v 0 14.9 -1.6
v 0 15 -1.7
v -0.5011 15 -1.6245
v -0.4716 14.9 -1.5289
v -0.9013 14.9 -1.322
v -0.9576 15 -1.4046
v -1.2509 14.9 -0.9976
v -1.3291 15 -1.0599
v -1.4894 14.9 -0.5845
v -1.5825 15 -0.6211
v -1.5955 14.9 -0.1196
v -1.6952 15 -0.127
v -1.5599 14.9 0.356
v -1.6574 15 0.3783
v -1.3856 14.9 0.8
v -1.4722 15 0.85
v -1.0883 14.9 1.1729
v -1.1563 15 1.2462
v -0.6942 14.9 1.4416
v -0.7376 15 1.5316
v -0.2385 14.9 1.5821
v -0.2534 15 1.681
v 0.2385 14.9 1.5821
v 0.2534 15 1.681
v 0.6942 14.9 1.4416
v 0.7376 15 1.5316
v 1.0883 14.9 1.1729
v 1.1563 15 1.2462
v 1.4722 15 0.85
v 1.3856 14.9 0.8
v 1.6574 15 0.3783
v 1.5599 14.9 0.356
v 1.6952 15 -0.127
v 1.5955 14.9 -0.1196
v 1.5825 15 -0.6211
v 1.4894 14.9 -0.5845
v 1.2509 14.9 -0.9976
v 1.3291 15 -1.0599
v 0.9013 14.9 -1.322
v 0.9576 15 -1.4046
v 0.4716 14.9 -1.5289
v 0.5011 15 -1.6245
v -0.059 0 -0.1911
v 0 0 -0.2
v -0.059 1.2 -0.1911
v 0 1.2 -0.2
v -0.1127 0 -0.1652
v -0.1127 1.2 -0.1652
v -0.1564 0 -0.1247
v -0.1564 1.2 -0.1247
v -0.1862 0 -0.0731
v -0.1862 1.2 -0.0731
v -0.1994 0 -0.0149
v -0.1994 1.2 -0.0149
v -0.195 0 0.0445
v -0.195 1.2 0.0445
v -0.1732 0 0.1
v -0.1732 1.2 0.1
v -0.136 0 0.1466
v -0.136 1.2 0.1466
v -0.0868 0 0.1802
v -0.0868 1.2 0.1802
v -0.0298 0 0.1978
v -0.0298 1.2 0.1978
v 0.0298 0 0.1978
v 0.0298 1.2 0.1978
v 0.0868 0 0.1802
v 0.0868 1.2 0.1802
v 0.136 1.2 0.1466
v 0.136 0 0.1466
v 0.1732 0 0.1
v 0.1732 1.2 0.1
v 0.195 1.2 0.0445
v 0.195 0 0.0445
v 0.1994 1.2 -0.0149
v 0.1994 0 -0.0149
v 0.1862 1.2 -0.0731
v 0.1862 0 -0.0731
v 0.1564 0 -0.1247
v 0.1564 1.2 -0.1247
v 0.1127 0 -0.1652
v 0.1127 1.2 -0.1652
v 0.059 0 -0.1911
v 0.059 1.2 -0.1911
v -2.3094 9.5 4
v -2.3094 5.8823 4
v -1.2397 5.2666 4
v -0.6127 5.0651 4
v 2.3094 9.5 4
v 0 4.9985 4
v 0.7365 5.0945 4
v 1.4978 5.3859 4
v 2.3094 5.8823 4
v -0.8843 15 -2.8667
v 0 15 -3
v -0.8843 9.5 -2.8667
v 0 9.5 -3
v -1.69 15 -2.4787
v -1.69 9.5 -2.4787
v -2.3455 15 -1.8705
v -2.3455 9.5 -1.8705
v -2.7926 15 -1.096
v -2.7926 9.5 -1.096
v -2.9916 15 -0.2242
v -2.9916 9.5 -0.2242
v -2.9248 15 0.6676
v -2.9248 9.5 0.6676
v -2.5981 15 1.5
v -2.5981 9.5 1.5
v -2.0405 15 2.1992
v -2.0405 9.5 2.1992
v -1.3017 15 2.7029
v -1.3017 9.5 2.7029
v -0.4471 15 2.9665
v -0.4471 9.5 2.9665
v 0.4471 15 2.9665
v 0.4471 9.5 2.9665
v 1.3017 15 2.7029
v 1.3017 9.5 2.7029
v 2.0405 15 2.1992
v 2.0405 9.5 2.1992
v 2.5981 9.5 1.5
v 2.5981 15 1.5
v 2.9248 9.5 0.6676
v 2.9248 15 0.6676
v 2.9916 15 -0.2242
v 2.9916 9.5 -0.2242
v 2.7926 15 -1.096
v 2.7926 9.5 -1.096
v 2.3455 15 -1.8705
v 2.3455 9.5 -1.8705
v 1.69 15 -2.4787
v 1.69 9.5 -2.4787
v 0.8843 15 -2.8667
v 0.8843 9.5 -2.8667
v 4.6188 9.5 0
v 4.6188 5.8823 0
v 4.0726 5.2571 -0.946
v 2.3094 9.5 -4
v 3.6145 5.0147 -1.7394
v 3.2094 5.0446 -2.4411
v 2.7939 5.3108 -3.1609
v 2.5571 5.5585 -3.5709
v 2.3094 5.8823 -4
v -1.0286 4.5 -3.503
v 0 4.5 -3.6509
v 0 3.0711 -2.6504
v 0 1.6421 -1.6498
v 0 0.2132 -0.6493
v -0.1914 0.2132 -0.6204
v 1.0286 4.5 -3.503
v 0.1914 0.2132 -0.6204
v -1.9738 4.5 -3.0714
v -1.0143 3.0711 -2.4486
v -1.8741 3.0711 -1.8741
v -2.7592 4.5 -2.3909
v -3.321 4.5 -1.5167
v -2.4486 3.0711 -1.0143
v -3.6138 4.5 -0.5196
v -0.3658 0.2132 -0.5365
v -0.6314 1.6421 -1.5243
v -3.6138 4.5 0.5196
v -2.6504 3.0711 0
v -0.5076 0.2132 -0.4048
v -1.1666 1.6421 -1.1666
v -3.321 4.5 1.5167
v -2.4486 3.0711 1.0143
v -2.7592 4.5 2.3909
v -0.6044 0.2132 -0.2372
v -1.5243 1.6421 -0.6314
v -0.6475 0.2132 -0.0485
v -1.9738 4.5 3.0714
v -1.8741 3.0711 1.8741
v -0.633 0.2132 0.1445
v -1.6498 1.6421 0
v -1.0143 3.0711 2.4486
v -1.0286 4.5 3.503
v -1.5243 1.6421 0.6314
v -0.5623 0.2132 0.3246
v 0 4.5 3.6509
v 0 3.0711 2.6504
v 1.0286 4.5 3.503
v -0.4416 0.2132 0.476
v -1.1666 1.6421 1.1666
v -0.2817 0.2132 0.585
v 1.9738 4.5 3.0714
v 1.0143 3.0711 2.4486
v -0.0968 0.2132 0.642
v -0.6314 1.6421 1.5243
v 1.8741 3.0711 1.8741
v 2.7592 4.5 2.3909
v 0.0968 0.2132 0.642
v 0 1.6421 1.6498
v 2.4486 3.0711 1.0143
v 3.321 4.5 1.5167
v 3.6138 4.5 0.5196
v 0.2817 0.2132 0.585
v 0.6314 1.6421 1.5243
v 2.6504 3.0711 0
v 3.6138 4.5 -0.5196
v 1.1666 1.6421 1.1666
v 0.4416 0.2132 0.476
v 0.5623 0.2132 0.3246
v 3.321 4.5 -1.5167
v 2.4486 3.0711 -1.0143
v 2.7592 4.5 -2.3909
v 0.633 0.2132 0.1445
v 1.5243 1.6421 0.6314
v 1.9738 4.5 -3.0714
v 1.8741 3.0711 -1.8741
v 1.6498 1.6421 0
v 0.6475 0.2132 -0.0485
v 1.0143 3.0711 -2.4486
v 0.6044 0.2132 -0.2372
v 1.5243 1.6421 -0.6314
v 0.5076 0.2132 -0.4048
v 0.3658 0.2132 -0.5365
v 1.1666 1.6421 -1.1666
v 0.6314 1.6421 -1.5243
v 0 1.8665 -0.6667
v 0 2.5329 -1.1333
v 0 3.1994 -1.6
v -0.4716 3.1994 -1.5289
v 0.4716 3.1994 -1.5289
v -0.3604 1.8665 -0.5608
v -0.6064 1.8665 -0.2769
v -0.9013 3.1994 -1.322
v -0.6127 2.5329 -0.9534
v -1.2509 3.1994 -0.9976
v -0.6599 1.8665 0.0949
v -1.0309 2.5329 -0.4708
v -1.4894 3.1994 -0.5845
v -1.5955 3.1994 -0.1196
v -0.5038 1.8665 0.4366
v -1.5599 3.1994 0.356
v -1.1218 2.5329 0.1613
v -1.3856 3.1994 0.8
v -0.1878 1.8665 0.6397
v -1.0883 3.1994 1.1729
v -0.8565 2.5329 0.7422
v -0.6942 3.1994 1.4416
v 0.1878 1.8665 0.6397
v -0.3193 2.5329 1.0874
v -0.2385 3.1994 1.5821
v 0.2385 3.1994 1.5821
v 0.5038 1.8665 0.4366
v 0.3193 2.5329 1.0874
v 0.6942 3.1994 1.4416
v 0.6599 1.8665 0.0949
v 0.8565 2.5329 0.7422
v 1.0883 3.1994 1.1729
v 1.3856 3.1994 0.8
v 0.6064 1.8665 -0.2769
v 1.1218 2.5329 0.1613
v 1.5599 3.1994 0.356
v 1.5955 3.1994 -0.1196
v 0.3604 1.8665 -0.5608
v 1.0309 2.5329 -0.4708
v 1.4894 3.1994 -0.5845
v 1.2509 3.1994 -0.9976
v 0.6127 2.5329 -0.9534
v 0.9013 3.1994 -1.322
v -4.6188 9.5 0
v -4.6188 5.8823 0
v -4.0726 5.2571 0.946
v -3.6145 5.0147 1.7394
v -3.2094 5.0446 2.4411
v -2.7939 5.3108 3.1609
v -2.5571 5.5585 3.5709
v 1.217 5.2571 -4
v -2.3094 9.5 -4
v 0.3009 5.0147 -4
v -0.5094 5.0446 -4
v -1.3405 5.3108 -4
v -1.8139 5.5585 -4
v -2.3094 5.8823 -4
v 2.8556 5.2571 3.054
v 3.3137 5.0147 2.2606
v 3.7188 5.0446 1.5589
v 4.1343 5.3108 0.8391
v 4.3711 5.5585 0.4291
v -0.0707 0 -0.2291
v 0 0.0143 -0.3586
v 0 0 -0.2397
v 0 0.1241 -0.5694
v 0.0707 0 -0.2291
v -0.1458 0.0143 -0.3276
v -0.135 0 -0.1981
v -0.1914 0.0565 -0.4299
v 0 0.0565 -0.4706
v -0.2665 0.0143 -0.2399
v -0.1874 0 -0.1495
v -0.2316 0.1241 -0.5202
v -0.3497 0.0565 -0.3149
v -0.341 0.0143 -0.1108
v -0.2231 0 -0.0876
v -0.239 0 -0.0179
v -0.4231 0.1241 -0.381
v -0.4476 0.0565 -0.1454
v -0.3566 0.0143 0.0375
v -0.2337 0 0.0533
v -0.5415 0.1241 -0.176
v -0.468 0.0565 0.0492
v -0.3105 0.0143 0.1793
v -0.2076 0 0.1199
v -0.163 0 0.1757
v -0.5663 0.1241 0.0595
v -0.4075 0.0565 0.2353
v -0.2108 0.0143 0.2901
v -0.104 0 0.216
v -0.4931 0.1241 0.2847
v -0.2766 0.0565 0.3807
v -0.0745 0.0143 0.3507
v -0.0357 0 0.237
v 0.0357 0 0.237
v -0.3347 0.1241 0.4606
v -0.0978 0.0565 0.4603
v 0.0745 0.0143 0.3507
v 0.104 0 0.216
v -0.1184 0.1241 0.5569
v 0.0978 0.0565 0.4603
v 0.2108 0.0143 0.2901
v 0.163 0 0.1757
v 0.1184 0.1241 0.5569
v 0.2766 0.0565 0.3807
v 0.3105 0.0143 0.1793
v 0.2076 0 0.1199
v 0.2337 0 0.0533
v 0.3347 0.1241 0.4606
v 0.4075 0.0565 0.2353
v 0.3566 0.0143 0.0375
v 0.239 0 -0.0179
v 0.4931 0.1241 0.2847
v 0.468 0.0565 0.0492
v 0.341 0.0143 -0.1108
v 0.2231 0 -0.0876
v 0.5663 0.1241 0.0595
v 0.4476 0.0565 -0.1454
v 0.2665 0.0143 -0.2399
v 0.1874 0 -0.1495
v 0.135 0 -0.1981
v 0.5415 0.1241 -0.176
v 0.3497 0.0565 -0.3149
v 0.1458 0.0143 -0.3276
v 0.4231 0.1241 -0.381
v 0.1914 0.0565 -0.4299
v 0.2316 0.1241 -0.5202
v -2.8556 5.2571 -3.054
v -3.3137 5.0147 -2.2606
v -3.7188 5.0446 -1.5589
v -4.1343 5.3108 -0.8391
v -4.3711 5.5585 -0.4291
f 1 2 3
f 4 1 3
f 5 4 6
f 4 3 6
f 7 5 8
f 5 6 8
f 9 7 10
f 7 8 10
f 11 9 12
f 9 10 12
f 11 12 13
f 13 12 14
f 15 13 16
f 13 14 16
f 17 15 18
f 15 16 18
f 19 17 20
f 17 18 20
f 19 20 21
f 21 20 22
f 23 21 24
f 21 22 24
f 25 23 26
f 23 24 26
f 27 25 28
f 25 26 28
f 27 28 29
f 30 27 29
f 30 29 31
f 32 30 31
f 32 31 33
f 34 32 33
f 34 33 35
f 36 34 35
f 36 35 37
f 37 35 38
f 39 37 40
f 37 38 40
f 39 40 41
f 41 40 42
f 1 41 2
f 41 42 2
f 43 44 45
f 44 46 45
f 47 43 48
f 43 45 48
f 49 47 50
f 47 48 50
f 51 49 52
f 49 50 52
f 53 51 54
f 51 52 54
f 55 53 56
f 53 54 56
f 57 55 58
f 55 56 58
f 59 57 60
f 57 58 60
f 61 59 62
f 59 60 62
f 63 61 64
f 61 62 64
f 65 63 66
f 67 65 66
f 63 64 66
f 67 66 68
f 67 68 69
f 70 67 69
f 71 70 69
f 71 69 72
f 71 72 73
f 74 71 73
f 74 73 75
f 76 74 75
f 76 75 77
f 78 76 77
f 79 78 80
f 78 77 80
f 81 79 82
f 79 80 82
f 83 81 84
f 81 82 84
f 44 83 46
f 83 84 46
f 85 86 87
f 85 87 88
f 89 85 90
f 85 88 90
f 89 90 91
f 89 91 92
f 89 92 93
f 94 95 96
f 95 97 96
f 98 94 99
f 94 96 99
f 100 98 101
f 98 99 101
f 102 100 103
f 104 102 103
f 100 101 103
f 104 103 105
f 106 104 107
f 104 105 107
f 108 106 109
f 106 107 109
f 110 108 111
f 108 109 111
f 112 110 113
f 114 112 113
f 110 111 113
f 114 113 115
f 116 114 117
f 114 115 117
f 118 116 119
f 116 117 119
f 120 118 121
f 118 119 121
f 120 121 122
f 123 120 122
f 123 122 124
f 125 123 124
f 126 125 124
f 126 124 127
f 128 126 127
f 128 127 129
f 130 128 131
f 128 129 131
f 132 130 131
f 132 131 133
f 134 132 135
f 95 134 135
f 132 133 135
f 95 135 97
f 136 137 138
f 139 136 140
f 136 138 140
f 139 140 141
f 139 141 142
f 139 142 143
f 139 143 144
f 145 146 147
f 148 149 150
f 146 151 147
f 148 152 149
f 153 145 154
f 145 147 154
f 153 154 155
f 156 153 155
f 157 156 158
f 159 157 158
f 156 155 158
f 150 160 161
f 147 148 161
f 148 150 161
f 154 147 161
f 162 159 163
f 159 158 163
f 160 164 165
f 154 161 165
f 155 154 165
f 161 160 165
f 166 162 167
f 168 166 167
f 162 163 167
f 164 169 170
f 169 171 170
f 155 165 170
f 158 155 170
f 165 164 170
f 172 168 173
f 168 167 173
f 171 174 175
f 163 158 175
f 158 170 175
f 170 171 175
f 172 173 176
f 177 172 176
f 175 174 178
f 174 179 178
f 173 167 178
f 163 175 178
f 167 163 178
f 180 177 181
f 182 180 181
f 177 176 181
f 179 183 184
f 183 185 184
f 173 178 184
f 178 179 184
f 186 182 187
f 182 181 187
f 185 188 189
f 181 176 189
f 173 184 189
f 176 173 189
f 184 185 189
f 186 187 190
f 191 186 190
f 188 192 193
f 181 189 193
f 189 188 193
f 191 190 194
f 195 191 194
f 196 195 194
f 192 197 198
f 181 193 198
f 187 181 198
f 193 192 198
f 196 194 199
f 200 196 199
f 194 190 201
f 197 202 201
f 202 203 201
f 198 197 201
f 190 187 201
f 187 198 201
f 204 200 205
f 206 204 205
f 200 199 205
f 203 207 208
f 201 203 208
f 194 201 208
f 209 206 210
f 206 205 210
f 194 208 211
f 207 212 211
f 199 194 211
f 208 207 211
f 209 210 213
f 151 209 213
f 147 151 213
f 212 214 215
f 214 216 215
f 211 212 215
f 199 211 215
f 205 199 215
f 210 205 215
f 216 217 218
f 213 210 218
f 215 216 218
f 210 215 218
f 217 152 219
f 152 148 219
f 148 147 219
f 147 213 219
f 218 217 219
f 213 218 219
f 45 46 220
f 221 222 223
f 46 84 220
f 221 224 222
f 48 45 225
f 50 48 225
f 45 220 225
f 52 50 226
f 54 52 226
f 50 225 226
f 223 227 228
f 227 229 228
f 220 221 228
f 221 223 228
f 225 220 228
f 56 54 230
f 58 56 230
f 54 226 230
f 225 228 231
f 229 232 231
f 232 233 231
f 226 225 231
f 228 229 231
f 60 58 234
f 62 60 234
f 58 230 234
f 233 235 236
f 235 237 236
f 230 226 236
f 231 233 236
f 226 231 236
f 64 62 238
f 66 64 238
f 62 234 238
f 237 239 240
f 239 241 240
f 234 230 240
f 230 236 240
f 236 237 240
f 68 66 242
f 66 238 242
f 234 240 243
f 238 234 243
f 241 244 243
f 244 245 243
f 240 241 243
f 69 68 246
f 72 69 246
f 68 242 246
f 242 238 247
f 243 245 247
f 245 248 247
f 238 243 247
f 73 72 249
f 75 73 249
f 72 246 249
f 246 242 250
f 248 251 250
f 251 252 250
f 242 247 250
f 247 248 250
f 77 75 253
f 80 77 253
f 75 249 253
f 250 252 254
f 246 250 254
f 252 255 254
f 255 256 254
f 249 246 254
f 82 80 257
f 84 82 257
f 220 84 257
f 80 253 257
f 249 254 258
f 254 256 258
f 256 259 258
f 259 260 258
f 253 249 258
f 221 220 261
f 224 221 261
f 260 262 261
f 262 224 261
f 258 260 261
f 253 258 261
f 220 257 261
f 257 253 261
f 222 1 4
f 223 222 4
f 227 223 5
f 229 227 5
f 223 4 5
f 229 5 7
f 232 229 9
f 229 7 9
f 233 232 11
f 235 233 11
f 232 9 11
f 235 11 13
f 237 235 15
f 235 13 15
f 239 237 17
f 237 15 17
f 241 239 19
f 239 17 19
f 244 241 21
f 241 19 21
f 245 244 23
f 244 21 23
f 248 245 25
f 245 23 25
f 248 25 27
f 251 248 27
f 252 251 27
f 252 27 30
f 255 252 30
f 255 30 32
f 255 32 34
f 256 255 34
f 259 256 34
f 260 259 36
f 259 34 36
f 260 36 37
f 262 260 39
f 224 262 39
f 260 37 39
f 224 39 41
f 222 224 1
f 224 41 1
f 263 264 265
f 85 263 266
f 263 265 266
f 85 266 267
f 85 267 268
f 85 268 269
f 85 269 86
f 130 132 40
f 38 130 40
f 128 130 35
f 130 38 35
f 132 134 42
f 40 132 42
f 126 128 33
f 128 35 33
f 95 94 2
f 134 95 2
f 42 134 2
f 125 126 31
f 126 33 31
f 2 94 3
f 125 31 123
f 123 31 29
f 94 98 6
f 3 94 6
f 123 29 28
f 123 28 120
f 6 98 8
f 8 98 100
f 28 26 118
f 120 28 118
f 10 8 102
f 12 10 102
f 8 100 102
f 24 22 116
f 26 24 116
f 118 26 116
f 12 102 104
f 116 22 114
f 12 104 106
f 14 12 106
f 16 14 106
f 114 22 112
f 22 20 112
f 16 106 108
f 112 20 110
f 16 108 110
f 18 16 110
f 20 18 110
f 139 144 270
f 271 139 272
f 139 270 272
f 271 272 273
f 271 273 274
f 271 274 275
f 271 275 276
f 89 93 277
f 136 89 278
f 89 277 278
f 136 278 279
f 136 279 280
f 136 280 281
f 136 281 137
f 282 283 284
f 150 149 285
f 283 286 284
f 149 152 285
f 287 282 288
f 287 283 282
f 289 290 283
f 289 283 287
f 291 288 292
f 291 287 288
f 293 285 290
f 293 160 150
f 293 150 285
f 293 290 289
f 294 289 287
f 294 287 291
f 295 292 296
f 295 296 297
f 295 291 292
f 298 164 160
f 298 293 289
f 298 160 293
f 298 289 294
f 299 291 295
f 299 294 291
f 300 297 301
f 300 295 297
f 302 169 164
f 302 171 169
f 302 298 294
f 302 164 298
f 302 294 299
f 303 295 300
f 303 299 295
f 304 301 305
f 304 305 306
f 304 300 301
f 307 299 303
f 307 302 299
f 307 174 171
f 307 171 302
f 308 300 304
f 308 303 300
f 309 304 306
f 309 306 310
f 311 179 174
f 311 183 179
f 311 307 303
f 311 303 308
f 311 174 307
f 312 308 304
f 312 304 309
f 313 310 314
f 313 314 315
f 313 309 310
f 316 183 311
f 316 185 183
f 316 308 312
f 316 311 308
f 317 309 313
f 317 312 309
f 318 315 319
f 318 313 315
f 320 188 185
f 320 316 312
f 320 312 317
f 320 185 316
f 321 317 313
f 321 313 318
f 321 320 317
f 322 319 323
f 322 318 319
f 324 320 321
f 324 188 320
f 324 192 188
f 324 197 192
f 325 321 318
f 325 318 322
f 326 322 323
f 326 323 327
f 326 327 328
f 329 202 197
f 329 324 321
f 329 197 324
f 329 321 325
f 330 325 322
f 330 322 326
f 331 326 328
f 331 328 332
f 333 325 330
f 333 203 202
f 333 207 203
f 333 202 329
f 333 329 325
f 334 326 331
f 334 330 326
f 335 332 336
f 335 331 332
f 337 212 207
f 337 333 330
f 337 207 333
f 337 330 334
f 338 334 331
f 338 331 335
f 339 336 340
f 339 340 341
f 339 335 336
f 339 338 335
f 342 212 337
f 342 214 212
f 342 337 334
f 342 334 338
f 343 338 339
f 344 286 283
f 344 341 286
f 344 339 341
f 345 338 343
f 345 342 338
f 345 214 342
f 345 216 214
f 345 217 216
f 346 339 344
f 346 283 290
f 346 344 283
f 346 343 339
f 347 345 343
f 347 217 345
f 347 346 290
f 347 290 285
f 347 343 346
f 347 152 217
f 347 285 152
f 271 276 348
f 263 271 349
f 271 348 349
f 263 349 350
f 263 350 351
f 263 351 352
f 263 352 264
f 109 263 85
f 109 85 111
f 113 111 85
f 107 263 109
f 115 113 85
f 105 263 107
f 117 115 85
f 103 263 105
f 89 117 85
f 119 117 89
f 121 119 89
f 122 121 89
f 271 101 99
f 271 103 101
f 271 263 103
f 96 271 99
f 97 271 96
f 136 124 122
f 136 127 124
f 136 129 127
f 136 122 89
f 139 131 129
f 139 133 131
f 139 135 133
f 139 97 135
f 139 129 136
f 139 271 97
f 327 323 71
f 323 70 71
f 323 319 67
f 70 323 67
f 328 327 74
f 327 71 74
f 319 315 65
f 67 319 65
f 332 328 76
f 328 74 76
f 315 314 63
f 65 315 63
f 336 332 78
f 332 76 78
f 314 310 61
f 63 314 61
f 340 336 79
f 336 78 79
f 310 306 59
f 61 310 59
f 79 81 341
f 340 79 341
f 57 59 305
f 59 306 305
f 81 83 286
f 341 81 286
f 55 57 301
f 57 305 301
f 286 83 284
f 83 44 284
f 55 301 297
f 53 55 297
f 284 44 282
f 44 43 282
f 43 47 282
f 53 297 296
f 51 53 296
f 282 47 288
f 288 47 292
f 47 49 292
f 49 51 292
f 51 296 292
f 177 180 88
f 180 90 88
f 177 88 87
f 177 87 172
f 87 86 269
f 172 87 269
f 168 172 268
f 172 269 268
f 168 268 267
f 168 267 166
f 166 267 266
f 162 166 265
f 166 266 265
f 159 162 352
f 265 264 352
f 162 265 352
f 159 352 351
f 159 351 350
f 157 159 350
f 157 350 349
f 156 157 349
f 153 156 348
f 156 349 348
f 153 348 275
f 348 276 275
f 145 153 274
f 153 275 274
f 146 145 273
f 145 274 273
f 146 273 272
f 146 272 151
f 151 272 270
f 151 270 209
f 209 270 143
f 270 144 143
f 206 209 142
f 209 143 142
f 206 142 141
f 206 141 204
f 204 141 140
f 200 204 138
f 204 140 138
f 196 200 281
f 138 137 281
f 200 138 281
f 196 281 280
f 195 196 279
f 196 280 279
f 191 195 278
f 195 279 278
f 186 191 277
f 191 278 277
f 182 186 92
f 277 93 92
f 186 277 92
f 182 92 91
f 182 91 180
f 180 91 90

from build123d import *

# Parameters (mm, degrees)
SALIENTE_EXTRUIR1_START = -5
CROQUIS3_R              = 3.650933922
SALIENTE_EXTRUIR1_DEPTH = 5
REDONDEO1_R             = 0.5
CHAFL_N1_SIZE           = 0.1


with BuildPart() as part:
    # Croquis1 → Revolución1 (revolve)
    with BuildSketch(Plane.XY, mode=Mode.PRIVATE) as revoluci_n1_sk:
        Polygon((0.2, 0), (0.2, 1.2), (1.6, 3.199407209), (1.6, 15), (3, 15), (3, 9.5), (3.650933922, 9.5), (3.650933922, 4.5), (0.5, 0), align=None)
    revolve(revoluci_n1_sk.sketch.rotate(Axis((0, 0, 0), (0, 1, 0)), 90), axis=Axis((0, 0, 0), (0, 1, 0)))

    # Croquis3 → Saliente-Extruir1 (add)
    with BuildSketch(Plane(origin=(0, 9.5, 0), x_dir=(1, 0, 0), z_dir=(0, 1, 0)).offset(SALIENTE_EXTRUIR1_START)):
        Polygon((-2.309401077, -4), (2.309401077, -4), (4.618802154, 0), (2.309401077, 4), (-2.309401077, 4), (-4.618802154, 0), align=None)
        Circle(CROQUIS3_R, mode=Mode.SUBTRACT)
    extrude(amount=SALIENTE_EXTRUIR1_DEPTH)

    # Redondeo1
    redondeo1_edges = [part.edges().sort_by_distance(p)[0] for p in [
        (0, 0, 0.5),
    ]]
    fillet(redondeo1_edges, radius=REDONDEO1_R)

    # Chaflán1
    chafl_n1_edges = [part.edges().sort_by_distance(p)[0] for p in [
        (0, 15, 1.6),
    ]]
    chamfer(chafl_n1_edges, length=CHAFL_N1_SIZE)

    # Croquis5 → Cortar-Revolución1 (revolve, cut)
    with BuildSketch(Plane.XY, mode=Mode.PRIVATE) as cortar_revoluci_n1_sk:
        Polygon((3.650933922, 4.5), (4.618802154, 5.882259086), (4.618802154, 4.5), align=None)
    revolve(cortar_revoluci_n1_sk.sketch.rotate(Axis((0, 15, 0), (0, -1, 0)), 90), axis=Axis((0, 15, 0), (0, -1, 0)), mode=Mode.SUBTRACT)


solid = part.part
